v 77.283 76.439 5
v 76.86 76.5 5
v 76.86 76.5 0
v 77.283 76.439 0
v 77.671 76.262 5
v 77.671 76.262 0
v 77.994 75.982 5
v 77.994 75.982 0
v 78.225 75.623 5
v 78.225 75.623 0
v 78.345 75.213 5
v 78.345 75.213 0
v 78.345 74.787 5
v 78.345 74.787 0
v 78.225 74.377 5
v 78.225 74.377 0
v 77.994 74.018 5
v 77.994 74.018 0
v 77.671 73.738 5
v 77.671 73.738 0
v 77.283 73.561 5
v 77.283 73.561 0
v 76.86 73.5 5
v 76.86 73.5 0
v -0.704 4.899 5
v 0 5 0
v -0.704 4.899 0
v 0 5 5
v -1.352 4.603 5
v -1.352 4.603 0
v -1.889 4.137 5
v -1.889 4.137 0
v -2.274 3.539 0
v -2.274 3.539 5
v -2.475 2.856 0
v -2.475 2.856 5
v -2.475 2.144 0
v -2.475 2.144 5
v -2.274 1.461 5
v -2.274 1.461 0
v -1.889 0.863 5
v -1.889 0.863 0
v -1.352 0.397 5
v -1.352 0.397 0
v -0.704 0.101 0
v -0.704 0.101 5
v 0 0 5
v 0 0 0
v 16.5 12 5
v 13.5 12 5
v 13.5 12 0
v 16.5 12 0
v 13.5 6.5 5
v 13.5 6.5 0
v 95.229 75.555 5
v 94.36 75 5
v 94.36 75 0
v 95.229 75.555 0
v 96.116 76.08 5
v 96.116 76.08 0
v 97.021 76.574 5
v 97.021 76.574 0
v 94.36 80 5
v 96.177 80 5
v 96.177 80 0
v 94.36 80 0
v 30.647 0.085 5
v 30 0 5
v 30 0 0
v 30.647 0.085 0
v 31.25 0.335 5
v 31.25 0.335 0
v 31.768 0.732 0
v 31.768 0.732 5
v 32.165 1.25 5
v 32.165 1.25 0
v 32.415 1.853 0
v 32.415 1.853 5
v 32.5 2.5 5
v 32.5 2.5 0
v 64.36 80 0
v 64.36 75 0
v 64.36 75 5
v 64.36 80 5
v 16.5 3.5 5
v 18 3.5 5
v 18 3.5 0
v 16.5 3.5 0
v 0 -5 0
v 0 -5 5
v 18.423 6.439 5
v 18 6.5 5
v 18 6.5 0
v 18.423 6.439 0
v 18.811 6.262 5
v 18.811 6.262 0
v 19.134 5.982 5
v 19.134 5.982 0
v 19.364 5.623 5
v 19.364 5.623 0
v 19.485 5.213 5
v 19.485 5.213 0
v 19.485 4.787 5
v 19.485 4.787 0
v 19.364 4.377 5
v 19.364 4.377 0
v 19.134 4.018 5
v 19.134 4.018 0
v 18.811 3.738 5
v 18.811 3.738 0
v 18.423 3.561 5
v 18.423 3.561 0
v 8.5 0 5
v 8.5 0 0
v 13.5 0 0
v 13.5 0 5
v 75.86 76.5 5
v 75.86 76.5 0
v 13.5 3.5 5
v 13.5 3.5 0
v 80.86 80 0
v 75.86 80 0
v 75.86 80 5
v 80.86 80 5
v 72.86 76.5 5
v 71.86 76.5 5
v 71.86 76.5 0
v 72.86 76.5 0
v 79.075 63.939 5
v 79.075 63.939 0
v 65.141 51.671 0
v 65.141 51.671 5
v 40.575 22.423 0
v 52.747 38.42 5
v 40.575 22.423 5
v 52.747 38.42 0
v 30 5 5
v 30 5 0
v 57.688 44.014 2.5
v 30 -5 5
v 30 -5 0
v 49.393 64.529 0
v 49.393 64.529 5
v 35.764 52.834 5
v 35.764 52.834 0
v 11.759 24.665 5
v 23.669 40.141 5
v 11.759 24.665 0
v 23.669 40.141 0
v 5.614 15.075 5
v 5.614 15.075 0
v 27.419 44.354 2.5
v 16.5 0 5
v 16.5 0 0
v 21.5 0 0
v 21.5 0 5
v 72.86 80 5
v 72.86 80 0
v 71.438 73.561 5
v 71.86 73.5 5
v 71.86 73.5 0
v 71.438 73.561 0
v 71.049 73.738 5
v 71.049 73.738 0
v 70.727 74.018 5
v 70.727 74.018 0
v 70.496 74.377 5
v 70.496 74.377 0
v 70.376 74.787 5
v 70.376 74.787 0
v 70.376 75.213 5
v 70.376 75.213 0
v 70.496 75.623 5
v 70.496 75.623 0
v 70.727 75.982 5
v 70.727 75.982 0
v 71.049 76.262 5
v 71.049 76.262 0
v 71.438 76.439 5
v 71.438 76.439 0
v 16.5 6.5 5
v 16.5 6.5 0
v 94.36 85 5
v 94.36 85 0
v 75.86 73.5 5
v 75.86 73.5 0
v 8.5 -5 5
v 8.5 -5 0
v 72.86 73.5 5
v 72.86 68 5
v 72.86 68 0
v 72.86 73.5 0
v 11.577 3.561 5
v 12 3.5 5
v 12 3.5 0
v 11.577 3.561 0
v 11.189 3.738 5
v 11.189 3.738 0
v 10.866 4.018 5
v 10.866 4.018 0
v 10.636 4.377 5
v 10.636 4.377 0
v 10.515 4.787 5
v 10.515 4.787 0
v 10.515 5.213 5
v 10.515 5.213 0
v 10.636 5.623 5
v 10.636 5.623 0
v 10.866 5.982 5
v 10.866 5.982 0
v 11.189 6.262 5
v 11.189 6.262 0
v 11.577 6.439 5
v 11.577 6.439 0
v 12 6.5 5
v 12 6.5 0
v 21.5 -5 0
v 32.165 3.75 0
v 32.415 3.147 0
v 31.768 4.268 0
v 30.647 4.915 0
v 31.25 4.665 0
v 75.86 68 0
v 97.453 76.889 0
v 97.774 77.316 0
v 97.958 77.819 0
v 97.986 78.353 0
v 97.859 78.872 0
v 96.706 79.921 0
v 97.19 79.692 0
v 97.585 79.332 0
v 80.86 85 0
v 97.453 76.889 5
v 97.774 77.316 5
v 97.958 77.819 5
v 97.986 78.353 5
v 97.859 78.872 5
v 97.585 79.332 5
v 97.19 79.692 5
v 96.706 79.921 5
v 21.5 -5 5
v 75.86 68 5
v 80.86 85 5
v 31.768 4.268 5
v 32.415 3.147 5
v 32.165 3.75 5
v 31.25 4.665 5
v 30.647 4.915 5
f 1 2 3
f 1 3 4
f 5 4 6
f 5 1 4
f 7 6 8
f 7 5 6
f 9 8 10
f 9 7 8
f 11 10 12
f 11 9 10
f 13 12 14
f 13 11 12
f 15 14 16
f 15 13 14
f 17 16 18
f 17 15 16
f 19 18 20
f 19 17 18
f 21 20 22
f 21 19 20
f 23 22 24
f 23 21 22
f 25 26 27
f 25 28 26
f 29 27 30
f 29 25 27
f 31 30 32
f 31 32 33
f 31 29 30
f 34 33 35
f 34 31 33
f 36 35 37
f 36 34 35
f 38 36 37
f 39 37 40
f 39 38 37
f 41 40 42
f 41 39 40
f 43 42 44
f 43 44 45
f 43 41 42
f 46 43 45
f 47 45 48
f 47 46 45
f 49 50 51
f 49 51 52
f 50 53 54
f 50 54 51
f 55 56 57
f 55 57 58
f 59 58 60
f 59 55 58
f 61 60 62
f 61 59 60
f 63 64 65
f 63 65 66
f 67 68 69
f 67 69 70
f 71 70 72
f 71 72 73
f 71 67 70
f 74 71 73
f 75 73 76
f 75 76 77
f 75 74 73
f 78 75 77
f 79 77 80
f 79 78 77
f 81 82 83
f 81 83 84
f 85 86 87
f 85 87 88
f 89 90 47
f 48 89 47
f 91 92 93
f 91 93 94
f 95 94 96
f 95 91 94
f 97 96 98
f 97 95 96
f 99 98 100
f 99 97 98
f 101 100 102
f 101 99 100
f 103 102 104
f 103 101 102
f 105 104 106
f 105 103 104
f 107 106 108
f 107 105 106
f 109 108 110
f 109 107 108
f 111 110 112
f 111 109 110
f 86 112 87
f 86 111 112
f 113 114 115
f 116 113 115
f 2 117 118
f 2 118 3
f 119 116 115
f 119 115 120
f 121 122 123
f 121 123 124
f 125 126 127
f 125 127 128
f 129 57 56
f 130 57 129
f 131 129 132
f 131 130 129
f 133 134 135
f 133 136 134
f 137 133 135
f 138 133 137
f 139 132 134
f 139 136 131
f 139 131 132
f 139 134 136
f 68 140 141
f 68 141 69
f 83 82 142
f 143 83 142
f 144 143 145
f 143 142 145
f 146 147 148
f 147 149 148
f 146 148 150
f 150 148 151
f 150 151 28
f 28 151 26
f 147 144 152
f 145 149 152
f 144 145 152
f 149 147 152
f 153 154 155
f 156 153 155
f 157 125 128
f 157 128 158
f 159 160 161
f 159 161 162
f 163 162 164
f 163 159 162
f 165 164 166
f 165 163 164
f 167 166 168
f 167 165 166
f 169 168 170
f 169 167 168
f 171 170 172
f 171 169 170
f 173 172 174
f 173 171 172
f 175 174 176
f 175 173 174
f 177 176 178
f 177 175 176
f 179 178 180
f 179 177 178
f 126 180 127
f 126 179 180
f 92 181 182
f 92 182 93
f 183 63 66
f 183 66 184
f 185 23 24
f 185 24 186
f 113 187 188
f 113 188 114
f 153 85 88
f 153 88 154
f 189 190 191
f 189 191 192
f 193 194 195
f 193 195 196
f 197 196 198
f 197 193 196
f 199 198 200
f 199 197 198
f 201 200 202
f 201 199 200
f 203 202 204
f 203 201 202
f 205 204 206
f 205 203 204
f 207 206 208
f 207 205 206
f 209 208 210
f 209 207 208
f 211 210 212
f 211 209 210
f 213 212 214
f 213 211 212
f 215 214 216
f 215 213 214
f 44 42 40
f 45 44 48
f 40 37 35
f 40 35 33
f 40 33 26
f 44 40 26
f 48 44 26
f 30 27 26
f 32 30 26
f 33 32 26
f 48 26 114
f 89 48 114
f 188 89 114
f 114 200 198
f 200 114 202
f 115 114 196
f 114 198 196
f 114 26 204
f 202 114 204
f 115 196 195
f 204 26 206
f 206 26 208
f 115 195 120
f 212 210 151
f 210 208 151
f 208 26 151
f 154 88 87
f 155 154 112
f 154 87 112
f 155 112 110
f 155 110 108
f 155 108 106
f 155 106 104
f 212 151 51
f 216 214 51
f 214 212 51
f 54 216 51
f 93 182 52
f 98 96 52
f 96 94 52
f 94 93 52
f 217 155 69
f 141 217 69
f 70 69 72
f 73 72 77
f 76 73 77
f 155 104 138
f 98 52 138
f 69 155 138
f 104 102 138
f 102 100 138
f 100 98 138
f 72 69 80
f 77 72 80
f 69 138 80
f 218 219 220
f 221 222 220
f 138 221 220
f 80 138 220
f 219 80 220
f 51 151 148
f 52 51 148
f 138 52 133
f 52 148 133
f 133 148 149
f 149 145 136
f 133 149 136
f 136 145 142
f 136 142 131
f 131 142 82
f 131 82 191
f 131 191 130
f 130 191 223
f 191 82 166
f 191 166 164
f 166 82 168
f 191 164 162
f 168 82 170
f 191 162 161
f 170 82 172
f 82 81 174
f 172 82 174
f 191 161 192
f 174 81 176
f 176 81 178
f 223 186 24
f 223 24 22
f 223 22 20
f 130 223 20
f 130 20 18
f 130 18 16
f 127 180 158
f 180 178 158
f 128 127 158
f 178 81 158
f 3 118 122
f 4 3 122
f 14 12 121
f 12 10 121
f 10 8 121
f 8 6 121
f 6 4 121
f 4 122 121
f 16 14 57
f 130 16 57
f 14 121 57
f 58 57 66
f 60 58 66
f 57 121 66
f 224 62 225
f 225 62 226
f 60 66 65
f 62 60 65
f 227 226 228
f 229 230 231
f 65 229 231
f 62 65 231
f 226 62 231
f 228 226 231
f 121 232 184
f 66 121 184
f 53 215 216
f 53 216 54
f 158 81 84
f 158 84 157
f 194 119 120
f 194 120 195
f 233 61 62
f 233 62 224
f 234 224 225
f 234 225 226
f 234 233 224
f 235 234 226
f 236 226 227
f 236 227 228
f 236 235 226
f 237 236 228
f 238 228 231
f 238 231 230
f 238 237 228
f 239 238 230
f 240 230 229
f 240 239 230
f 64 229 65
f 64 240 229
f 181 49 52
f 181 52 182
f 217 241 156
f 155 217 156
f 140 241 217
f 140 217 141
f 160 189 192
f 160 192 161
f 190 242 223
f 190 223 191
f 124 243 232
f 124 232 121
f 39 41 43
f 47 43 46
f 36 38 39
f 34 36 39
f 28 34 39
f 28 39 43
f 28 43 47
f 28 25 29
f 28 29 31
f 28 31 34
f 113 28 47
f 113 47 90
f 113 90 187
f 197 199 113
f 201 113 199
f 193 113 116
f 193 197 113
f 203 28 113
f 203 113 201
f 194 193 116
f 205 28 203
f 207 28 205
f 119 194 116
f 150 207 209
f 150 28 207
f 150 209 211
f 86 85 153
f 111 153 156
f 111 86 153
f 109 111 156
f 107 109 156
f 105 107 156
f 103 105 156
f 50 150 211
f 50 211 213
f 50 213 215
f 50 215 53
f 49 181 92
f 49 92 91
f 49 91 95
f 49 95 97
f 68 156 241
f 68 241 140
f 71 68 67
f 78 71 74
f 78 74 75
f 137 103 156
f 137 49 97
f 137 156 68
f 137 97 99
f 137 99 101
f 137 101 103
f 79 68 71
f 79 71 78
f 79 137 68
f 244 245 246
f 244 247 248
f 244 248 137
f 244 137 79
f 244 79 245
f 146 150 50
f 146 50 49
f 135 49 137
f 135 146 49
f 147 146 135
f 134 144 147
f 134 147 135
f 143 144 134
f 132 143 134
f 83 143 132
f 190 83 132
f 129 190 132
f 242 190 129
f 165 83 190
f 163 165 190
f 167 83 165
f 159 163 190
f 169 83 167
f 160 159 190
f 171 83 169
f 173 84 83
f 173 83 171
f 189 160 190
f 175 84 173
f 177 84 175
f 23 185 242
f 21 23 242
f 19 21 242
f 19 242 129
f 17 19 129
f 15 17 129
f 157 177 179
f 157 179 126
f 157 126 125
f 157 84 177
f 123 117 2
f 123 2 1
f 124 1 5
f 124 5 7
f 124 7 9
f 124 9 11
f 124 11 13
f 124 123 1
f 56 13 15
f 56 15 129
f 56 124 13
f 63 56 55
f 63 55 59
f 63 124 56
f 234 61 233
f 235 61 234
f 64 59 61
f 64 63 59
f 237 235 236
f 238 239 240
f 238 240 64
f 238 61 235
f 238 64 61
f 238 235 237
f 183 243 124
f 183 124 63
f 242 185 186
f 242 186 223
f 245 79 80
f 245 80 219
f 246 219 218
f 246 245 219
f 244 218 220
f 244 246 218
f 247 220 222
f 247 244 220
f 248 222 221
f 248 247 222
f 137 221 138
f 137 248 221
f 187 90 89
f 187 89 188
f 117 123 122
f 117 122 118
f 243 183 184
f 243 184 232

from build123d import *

# Parameters (mm, degrees)
SKETCH1_W           = 30
SKETCH1_H           = 5
BOSS_EXTRUDE1_DEPTH = 5
SKETCH3_OUTSIDE_W   = 121.122
SKETCH3_OUTSIDE_H   = 106.762
CUT_EXTRUDE1_DEPTH  = 10
SKETCH4_R           = 1.816989411
SKETCH4_W           = 8.5
SKETCH4_H           = 5
SKETCH4_R_2         = 2.5
BOSS_EXTRUDE2_DEPTH = 5


with BuildPart() as part:
    # Sketch1 → Boss-Extrude1 (new body)
    with BuildSketch(Plane.XY):
        with Locations((15, 2.5)):
            Rectangle(SKETCH1_W, SKETCH1_H)
        with BuildLine():
            add(Edge.make_bspline(
                [(94.36042114, 75), (53.195461928, 48.027295895), (30, 5)],
                knots=[0, 0, 0, 1, 1, 1], degree=2))
            Line((30, 5), (0, 5))
            add(Edge.make_bspline(
                [(64.36042114, 75), (22.658434304, 48.707086793), (0, 5)],
                knots=[0, 0, 0, 1, 1, 1], degree=2))
            Line((64.36042114, 75), (94.36042114, 75))
        make_face()
        with Locations((79.36042114, 77.5)):
            Rectangle(SKETCH1_W, SKETCH1_H)
    extrude(amount=BOSS_EXTRUDE1_DEPTH)

    # Sketch3 outside → Cut-Extrude1 (cut)
    with BuildSketch(Plane.XY.offset(5)):
        with Locations((47.18, 40)):
            Rectangle(SKETCH3_OUTSIDE_W, SKETCH3_OUTSIDE_H)
        with BuildLine():
            Line((72.86042114, 76.5), (72.86042114, 80))
            Line((72.86042114, 80), (64.36042114, 80))
            Line((64.36042114, 80), (64.36042114, 75))
            add(Edge.make_bspline(
                [(64.36042114, 75), (22.658434304, 48.707086793), (0, 5)],
                knots=[0, 0, 0, 1, 1, 1], degree=2))
            Line((0, 5), (0, 0))
            Line((0, 0), (13.5, 0))
            Line((13.5, 0), (13.5, 3.5))
            Line((13.5, 3.5), (12, 3.5))
            ThreePointArc((12, 3.5), (10.5, 5), (12, 6.5))
            Line((12, 6.5), (13.5, 6.5))
            Line((13.5, 6.5), (13.5, 12))
            Line((13.5, 12), (16.5, 12))
            Line((16.5, 12), (16.5, 6.5))
            Line((16.5, 6.5), (18, 6.5))
            ThreePointArc((18, 6.5), (19.5, 5), (18, 3.5))
            Line((18, 3.5), (16.5, 3.5))
            Line((16.5, 3.5), (16.5, 0))
            Line((16.5, 0), (30, 0))
            Line((30, 0), (30, 5))
            add(Edge.make_bspline(
                [(30, 5), (53.195461928, 48.027295895), (94.36042114, 75)],
                knots=[0, 0, 0, 1, 1, 1], degree=2))
            Line((94.36042114, 75), (94.36042114, 80))
            Line((94.36042114, 80), (75.86042114, 80))
            Line((75.86042114, 80), (75.86042114, 76.5))
            Line((75.86042114, 76.5), (76.86042114, 76.5))
            ThreePointArc((76.86042114, 76.5), (78.36042114, 75), (76.86042114, 73.5))
            Line((76.86042114, 73.5), (75.86042114, 73.5))
            Line((75.86042114, 73.5), (75.86042114, 68))
            Line((75.86042114, 68), (72.86042114, 68))
            Line((72.86042114, 68), (72.86042114, 73.5))
            Line((72.86042114, 73.5), (71.86042114, 73.5))
            ThreePointArc((71.86042114, 73.5), (70.36042114, 75), (71.86042114, 76.5))
            Line((71.86042114, 76.5), (72.86042114, 76.5))
        make_face(mode=Mode.SUBTRACT)
    extrude(amount=-CUT_EXTRUDE1_DEPTH, mode=Mode.SUBTRACT)

    # Sketch4 → Boss-Extrude2 (add)
    with BuildSketch(Plane.XY.offset(5)):
        Polygon((94.285794486, 80), (94.36042114, 80), (94.36042114, 85), (80.86042114, 85), (80.86042114, 80), align=None)
        with Locations((96.177410551, 78.183010589)):
            Circle(SKETCH4_R)
        with BuildLine():
            Line((96.177410551, 80), (94.36042114, 80))
            Line((94.36042114, 80), (94.36042114, 78.183010589))
            ThreePointArc((94.36042114, 78.183010589), (94.892605017, 79.467816123), (96.177410551, 80))
        make_face()
        with BuildLine():
            ThreePointArc((97.020667914, 76.573548711), (95.23686262, 76.628398062), (94.36042114, 78.183010589))
            Line((94.36042114, 78.183010589), (94.36042114, 75))
            ThreePointArc((94.36042114, 75), (95.670266462, 75.821056521), (97.020667914, 76.573548711))
        make_face()
        with Locations((25.75, -2.5)):
            Rectangle(SKETCH4_W, SKETCH4_H)
        with Locations((4.25, -2.5)):
            Rectangle(SKETCH4_W, SKETCH4_H)
        with BuildLine():
            Line((30, 5), (30, 0))
            ThreePointArc((30, 0), (31.767766953, 0.732233047), (32.5, 2.5))
            ThreePointArc((32.5, 2.5), (31.767766953, 4.267766953), (30, 5))
        make_face()
        with BuildLine():
            ThreePointArc((30, 5), (27.5, 2.5), (30, 0))
            Line((30, 0), (30, 5))
        make_face()
        with Locations((0, 2.5)):
            Circle(SKETCH4_R_2)
    extrude(amount=-BOSS_EXTRUDE2_DEPTH)


solid = part.part
